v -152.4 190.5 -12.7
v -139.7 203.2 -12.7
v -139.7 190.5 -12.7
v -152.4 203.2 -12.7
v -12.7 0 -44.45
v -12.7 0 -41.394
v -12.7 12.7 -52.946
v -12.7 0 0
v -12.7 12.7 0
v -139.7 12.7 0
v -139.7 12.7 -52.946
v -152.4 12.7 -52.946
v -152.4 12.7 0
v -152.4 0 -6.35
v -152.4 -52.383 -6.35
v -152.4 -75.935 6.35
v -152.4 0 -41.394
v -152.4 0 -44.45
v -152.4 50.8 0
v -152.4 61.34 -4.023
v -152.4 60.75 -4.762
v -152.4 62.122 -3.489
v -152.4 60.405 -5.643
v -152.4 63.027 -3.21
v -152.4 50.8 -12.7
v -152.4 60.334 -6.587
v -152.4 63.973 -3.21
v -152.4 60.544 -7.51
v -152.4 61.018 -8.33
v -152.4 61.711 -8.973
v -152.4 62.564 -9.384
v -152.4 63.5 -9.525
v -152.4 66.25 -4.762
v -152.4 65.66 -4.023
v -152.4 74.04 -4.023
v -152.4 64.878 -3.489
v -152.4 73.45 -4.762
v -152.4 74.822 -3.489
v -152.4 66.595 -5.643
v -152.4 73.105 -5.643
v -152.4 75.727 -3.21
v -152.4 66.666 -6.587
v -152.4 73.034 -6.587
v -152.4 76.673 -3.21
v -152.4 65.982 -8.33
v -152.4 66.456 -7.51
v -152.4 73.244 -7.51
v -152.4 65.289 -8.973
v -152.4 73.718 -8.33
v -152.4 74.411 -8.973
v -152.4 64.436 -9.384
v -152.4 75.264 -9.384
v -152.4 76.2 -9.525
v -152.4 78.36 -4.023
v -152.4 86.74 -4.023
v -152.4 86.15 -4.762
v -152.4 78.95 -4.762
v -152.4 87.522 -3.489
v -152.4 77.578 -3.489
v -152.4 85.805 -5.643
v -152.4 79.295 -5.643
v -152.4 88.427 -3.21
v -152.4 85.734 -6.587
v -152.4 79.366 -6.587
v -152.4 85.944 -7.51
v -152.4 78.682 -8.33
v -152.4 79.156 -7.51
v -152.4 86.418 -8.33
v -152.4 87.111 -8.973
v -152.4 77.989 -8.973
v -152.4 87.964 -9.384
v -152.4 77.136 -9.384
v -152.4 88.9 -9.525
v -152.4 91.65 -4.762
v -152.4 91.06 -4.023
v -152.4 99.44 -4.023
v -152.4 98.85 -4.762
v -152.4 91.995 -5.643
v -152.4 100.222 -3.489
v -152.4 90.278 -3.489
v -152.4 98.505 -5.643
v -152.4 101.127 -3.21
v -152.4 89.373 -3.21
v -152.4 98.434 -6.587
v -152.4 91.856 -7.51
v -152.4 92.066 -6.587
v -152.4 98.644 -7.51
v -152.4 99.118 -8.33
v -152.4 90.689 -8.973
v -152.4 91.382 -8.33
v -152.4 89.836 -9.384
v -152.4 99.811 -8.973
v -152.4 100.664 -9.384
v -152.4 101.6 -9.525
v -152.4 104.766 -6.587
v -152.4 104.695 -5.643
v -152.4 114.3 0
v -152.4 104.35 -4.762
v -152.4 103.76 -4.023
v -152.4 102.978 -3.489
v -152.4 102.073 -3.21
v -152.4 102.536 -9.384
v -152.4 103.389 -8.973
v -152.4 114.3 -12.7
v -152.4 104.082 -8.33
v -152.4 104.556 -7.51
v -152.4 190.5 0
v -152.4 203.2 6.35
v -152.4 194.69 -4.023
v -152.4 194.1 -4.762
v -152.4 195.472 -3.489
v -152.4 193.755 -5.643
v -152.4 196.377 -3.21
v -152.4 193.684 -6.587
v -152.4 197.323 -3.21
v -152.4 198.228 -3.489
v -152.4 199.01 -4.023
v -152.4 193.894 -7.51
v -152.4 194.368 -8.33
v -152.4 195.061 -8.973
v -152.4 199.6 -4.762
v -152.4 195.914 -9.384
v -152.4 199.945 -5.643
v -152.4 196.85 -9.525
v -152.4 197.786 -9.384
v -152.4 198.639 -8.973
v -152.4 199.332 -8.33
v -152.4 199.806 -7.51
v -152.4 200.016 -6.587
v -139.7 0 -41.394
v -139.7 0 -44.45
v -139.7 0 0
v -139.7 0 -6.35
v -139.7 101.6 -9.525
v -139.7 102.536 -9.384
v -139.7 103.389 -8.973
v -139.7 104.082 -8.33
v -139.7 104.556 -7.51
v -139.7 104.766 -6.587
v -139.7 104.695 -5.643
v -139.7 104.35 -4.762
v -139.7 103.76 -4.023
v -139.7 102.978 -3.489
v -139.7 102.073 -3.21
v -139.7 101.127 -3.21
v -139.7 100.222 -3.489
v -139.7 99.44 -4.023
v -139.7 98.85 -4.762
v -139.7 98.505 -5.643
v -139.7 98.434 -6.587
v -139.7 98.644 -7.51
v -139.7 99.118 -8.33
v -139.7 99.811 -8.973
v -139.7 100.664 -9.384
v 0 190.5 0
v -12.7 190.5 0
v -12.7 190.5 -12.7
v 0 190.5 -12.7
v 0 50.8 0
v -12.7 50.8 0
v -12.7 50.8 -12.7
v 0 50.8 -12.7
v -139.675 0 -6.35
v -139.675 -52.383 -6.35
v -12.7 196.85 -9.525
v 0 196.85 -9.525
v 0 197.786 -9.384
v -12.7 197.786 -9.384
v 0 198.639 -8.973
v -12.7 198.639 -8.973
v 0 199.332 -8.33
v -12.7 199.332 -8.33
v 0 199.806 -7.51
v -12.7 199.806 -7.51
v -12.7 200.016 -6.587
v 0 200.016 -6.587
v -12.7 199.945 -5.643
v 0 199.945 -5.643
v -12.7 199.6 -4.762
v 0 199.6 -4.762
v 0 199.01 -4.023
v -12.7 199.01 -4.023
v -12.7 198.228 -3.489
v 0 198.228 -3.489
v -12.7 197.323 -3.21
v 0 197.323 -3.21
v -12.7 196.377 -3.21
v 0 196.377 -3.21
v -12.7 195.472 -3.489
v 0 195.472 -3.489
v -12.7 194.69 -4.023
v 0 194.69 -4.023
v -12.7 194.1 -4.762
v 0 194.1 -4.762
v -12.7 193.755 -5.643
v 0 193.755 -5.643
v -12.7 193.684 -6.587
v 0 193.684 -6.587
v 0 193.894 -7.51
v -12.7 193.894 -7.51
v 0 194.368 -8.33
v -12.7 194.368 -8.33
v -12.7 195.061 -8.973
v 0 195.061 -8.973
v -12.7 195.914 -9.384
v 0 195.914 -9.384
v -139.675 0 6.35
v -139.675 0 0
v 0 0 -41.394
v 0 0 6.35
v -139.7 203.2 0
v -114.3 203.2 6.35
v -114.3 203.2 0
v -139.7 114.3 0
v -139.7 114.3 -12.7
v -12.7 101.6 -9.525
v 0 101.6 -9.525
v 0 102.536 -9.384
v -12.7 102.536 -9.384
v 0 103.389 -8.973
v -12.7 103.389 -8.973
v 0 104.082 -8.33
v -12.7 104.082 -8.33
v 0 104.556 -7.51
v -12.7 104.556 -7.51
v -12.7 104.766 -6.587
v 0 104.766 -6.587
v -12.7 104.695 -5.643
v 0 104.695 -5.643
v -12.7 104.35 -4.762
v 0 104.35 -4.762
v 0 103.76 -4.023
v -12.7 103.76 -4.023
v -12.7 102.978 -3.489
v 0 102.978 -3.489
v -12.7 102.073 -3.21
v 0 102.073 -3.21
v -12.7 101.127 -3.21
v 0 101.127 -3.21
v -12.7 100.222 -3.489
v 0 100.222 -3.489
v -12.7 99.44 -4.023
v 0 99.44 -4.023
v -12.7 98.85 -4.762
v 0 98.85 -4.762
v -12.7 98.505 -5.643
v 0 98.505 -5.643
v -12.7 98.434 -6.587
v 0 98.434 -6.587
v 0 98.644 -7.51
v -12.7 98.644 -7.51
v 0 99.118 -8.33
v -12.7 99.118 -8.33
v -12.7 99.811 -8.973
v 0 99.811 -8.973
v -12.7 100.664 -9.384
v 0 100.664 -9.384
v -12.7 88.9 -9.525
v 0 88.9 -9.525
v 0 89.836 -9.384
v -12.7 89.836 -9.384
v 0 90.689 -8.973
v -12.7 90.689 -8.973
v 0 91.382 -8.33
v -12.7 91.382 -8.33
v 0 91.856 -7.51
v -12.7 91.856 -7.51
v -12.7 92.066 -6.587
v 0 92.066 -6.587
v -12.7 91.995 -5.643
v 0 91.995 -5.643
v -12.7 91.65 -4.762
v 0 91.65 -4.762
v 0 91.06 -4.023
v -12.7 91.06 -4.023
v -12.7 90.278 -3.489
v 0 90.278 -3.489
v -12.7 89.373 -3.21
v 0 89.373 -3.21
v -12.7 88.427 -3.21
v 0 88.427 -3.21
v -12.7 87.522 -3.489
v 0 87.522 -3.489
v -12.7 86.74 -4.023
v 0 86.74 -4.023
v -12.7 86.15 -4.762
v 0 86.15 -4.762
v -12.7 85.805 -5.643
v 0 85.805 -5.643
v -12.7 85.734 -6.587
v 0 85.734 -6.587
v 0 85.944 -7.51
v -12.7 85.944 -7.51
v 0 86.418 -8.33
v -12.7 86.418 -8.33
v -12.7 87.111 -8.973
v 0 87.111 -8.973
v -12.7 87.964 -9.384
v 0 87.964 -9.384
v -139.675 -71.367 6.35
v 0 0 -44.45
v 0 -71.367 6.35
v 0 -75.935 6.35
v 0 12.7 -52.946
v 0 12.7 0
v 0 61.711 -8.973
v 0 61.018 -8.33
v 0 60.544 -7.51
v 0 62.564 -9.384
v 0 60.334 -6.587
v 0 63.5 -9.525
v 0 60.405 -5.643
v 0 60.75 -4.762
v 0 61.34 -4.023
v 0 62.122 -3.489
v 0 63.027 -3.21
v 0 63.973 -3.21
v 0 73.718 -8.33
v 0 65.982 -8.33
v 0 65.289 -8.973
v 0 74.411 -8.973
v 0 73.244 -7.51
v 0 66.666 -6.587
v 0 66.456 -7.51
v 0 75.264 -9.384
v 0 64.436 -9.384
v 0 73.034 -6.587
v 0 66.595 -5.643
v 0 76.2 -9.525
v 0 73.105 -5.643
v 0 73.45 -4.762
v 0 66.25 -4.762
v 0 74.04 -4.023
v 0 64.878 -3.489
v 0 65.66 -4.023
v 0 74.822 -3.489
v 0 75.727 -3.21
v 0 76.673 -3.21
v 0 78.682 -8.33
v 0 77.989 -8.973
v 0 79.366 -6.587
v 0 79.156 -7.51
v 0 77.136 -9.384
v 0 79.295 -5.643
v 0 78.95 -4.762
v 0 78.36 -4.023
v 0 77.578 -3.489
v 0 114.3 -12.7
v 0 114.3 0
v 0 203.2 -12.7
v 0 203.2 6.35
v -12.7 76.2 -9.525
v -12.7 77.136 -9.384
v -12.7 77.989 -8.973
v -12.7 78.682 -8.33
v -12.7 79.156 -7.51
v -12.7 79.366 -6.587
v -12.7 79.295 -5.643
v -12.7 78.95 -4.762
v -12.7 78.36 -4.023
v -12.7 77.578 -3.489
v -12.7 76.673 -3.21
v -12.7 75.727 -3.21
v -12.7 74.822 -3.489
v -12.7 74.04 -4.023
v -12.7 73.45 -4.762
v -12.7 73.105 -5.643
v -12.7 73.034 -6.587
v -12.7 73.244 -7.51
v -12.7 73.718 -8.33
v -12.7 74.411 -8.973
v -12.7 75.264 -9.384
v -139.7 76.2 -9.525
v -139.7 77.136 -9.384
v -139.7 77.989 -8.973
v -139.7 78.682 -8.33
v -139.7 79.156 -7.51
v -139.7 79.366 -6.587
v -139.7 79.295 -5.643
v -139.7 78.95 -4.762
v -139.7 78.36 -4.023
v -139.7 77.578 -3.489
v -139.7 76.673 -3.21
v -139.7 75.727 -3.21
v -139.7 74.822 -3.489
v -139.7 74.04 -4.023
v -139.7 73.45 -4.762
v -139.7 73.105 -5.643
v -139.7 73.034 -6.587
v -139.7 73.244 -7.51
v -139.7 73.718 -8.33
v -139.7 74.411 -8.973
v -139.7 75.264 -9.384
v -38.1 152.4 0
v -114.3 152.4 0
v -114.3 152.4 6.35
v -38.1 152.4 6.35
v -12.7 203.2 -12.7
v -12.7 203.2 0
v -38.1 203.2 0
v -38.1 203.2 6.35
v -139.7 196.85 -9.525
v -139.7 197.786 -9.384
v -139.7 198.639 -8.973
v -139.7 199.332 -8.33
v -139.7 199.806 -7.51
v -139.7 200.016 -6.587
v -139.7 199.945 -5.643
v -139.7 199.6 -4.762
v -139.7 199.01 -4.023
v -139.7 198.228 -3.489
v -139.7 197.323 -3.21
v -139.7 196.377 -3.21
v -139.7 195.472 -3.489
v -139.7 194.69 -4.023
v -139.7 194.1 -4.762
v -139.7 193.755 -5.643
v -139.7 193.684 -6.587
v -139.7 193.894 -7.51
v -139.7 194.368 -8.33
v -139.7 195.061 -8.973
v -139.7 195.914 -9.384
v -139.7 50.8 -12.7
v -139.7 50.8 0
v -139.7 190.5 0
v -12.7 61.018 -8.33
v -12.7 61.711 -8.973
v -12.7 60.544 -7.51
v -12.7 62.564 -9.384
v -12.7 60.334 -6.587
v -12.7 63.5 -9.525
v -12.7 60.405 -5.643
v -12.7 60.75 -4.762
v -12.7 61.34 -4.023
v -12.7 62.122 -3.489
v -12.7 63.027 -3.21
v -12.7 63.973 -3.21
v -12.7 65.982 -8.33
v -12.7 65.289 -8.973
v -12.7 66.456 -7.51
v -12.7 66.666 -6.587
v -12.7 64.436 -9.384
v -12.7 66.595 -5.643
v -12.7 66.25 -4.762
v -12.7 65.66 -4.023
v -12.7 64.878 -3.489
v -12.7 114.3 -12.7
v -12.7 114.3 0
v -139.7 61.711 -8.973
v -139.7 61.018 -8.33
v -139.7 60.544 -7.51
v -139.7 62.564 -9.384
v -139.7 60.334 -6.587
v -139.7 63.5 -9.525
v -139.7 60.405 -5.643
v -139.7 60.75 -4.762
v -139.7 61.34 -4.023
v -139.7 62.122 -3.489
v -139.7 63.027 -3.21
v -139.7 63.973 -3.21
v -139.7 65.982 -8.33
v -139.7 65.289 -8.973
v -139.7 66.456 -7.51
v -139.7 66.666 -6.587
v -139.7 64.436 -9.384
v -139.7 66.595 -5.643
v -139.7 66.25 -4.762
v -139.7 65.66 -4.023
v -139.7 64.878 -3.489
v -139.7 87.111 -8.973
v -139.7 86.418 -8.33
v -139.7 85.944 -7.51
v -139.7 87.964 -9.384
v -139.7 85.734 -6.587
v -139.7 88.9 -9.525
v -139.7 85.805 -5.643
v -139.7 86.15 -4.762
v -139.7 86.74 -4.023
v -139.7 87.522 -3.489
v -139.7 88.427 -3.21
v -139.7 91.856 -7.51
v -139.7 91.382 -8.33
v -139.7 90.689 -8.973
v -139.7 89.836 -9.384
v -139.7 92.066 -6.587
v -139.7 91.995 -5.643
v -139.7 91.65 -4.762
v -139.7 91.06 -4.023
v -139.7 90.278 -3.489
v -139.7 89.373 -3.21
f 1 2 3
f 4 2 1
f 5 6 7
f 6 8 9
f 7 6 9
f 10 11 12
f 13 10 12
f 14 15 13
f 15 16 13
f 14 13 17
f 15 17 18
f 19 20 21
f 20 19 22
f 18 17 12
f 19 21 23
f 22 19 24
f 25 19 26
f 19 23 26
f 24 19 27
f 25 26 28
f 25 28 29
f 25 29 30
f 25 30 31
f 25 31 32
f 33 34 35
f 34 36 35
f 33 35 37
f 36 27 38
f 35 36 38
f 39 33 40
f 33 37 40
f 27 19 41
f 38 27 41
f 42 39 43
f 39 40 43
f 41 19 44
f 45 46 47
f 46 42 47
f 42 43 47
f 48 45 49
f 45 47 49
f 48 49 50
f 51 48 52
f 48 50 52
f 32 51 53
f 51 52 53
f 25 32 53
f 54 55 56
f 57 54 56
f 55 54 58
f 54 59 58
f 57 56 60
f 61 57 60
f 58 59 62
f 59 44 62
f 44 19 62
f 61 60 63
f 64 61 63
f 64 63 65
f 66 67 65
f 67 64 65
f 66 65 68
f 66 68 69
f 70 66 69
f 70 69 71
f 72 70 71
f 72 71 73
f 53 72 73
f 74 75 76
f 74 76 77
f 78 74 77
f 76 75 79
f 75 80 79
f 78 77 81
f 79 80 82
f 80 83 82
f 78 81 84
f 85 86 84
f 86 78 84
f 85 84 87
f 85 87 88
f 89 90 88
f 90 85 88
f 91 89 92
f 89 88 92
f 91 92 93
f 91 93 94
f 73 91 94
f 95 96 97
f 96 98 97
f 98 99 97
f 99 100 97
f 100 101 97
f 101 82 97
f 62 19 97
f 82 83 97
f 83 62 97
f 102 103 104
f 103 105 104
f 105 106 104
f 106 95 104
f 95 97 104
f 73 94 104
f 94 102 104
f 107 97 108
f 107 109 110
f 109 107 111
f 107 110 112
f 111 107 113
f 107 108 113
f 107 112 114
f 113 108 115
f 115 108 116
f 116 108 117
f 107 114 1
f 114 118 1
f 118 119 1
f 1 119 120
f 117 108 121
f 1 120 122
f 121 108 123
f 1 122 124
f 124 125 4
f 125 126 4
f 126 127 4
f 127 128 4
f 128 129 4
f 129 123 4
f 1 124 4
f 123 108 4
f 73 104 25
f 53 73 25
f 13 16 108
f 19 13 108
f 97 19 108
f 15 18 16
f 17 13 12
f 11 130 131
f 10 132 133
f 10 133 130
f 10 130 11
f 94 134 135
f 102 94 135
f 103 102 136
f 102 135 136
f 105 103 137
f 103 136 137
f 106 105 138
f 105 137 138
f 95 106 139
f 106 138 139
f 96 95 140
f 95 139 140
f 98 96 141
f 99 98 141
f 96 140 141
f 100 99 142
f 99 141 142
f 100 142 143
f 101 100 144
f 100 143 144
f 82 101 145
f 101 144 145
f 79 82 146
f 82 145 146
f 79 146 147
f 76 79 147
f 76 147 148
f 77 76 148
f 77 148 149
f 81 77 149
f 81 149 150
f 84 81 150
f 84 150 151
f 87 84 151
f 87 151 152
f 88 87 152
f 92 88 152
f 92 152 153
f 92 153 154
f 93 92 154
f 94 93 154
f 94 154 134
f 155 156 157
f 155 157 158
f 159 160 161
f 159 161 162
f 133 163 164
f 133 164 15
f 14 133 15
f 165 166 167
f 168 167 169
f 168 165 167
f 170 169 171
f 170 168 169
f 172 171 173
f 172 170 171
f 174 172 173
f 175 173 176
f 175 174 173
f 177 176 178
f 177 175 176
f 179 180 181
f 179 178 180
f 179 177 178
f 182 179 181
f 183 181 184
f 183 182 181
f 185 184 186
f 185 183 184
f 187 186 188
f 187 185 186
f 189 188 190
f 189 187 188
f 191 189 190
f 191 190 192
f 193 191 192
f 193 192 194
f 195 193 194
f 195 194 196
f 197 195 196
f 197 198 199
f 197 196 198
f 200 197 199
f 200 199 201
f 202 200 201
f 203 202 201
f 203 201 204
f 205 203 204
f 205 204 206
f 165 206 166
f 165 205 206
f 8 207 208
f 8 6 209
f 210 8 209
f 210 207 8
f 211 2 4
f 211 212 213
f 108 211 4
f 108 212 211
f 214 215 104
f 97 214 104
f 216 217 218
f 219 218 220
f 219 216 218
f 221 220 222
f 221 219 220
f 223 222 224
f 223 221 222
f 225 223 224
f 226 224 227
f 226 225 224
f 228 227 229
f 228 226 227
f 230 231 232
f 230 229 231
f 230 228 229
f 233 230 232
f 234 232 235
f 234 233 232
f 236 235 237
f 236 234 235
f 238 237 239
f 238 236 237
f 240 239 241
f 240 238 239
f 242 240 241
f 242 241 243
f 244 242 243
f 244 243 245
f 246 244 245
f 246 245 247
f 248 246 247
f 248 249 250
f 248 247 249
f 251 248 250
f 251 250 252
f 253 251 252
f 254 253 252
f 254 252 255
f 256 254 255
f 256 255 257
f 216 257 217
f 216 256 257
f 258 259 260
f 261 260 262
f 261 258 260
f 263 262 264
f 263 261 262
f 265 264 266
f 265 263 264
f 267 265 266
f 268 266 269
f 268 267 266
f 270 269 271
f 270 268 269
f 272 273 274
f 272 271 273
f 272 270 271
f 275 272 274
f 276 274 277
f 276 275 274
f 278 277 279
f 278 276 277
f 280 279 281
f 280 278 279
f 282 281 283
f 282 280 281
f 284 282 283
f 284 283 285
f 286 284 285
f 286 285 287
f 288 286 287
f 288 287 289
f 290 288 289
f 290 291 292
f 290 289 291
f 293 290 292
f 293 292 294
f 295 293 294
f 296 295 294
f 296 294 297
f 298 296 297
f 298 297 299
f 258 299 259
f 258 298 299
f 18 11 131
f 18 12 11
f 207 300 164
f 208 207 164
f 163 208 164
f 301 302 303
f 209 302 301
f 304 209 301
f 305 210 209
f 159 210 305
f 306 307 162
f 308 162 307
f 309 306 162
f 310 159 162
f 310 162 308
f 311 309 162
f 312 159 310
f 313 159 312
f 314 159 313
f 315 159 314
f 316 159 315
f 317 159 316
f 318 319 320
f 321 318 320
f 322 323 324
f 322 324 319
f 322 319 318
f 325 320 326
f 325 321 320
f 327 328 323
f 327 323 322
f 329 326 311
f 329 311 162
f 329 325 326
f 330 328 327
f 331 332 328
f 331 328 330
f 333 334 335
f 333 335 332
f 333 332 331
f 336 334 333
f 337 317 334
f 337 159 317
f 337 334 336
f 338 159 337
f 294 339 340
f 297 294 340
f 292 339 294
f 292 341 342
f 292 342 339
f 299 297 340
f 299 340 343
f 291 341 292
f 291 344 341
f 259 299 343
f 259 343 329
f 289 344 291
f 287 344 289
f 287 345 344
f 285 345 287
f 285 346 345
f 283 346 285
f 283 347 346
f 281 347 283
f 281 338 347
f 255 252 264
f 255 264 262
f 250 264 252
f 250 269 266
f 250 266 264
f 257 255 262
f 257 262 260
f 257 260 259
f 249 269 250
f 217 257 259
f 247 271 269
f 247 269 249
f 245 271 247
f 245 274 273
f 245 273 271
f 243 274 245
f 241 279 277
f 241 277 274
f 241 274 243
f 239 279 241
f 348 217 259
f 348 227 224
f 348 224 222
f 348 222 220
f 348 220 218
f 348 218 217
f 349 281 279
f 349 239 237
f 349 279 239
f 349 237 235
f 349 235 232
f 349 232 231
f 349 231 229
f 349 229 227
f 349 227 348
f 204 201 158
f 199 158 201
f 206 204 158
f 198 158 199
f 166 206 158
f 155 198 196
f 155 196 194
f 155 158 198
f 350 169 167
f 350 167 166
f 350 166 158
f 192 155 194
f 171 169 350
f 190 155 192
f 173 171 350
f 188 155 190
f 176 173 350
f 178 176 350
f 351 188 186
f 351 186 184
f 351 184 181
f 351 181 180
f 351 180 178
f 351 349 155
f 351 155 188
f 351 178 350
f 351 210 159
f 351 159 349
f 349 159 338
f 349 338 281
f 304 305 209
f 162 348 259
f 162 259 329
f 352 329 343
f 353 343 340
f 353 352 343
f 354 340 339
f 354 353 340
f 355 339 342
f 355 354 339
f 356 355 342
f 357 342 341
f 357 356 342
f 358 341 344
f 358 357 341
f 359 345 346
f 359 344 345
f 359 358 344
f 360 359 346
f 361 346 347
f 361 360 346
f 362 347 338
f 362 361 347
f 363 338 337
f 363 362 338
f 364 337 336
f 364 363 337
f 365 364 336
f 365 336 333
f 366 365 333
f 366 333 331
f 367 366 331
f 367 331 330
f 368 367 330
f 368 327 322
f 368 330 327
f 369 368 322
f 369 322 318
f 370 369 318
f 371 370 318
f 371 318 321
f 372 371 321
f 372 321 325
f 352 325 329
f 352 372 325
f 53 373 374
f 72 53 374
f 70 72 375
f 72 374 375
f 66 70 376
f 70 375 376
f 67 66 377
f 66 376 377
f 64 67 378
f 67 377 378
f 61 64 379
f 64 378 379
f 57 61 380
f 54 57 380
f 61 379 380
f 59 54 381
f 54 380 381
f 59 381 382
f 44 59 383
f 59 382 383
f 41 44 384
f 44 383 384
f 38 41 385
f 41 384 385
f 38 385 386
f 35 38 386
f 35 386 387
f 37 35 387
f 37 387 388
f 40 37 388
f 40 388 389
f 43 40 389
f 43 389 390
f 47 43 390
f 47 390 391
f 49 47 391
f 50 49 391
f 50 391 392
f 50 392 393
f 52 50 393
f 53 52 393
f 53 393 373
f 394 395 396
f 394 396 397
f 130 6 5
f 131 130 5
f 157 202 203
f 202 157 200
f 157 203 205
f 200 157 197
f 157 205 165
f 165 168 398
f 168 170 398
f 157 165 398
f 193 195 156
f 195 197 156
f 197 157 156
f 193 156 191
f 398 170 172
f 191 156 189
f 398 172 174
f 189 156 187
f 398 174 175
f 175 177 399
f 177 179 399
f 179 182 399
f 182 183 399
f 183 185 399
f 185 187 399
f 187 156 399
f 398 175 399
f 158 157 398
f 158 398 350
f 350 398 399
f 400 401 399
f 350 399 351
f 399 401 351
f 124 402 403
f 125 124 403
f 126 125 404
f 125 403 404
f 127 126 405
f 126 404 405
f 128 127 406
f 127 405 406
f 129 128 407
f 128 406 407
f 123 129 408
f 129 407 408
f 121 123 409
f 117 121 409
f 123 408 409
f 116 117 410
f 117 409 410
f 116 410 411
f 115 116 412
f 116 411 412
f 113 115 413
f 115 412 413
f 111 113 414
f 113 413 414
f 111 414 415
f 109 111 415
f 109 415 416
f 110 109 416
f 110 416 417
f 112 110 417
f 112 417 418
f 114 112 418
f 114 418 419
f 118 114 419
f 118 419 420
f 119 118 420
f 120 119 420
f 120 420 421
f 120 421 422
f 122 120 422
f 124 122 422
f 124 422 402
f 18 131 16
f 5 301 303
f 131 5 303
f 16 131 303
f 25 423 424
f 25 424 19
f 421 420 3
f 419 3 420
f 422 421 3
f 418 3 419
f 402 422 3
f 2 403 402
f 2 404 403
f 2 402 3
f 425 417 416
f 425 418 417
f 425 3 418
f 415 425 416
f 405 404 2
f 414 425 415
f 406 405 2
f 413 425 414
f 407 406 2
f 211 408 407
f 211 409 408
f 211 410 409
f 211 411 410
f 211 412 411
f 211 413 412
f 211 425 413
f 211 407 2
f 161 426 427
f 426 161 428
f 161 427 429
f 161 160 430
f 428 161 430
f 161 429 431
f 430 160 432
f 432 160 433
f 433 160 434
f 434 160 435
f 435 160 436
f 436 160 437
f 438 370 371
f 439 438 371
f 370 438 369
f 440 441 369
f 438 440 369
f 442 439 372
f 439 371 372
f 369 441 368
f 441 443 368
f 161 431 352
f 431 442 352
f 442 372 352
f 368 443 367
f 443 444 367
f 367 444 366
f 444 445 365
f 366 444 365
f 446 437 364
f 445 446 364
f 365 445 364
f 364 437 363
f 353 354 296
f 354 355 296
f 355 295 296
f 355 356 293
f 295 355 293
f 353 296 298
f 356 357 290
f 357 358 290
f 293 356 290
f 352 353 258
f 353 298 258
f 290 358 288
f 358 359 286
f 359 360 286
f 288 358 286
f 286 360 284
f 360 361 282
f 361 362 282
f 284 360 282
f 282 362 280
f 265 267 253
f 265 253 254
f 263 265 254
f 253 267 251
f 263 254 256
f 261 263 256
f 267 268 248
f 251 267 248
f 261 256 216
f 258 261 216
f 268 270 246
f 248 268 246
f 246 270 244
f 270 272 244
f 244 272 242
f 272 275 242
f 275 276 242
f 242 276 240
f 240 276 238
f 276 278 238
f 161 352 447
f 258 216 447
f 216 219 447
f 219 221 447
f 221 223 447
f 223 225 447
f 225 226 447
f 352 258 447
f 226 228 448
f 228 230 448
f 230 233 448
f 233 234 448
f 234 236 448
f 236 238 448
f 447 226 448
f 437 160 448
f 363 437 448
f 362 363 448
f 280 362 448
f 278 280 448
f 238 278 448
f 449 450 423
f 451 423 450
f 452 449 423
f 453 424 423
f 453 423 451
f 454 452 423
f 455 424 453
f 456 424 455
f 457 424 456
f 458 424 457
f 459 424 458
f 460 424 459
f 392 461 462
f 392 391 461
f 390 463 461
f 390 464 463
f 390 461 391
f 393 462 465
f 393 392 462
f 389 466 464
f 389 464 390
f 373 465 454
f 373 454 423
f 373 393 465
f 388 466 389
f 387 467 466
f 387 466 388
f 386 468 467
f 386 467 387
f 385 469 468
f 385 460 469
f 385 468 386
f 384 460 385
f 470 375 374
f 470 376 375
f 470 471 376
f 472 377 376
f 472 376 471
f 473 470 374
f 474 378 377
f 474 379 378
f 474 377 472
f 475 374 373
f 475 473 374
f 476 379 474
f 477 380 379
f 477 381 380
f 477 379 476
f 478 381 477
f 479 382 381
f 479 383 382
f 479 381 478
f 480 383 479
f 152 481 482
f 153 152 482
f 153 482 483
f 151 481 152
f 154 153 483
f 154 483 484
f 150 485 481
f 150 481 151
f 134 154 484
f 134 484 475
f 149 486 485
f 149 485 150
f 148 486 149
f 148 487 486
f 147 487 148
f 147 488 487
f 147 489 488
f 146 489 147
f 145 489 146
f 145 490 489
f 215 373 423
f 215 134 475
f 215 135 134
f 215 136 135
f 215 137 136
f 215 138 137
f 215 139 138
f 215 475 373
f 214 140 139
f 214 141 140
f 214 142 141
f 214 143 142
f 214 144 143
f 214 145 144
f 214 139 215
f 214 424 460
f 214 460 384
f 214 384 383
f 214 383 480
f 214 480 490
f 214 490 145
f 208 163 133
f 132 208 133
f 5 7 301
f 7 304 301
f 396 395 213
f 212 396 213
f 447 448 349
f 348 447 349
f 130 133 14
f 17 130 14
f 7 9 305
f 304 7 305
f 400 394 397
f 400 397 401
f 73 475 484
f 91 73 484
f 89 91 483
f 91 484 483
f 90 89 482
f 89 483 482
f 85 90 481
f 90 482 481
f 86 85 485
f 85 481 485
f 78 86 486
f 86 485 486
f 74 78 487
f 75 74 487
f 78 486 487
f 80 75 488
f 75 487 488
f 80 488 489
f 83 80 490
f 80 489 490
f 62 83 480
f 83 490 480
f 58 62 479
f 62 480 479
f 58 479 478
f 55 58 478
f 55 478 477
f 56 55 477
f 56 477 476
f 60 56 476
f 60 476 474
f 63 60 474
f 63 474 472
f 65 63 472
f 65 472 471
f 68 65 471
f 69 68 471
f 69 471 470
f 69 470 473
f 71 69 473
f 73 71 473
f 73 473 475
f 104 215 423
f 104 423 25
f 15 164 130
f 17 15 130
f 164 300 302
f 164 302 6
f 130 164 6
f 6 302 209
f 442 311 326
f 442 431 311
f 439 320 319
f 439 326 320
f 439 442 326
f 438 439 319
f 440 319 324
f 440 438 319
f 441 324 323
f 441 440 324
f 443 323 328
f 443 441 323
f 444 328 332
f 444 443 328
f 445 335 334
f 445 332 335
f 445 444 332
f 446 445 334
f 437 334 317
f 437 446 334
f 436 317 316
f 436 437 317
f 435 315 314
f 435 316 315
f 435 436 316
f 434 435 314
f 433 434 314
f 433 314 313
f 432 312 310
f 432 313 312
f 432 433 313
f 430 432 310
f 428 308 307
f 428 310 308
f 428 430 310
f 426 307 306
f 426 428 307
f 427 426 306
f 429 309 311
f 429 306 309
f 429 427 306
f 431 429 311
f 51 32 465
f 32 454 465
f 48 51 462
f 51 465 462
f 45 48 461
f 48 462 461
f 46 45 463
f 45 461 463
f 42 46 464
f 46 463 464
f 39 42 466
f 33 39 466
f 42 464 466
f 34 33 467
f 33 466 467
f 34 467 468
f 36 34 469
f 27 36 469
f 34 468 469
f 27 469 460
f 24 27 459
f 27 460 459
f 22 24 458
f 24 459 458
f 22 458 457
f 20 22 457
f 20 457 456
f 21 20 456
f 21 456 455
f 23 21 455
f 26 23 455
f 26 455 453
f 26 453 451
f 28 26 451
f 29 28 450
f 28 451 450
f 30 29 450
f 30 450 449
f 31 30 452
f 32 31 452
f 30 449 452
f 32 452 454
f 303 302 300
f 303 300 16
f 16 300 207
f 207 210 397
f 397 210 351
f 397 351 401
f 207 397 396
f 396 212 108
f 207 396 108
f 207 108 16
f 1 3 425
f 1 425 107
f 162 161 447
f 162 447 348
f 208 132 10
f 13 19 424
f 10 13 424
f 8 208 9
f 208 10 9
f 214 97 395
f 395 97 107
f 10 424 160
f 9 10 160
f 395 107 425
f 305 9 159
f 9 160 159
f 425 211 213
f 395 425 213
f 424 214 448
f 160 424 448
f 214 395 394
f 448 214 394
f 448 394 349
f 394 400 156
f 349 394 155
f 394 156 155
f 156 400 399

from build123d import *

# Parameters (mm, degrees)
SKETCH1_W               = 152.4
SKETCH1_H               = 203.2
BOSS_EXTRUDE1_DEPTH     = 6.35
CUT_EXTRUDE1_DEPTH      = 255.079362602
CUT_EXTRUDE1_DEPTH_BACK = 255.079362602
SKETCH2_W               = 76.2
SKETCH2_H               = 50.8
SKETCH3_W               = 12.7
SKETCH3_H               = 12.7
SKETCH3_H_2             = 63.5
BOSS_EXTRUDE2_DEPTH     = 12.7
SKETCH4_R               = 3.175
CUT_EXTRUDE2_DEPTH      = 247.916220609
BOSS_EXTRUDE3_DEPTH     = 152.4
BOSS_EXTRUDE5_REACH     = 259.86
SKETCH11_W              = 12.72505143
SKETCH11_H              = 12.7
BOSS_EXTRUDE8_REACH     = 259.86
SKETCH13_W              = 12.7
SKETCH13_H              = 12.7


with BuildPart() as part:
    # Sketch1 → Boss-Extrude1 (new body)
    with BuildSketch(Plane.XY):
        with Locations((-76.2, 101.6)):
            Rectangle(SKETCH1_W, SKETCH1_H)
    extrude(amount=BOSS_EXTRUDE1_DEPTH)

    # Sketch2 → Cut-Extrude1 (cut, two sides: drawn at the far end of the back side and taken through both)
    with BuildSketch(Plane.XY.offset(6.35).offset(-CUT_EXTRUDE1_DEPTH_BACK)):
        with Locations((-76.2, 177.8)):
            Rectangle(SKETCH2_W, SKETCH2_H)
    extrude(amount=CUT_EXTRUDE1_DEPTH + CUT_EXTRUDE1_DEPTH_BACK, mode=Mode.SUBTRACT)

    # Sketch3 → Boss-Extrude2 (add)
    with BuildSketch(Plane(origin=(0, 0, 0), x_dir=(-1, 0, 0), z_dir=(0, 0, -1))):
        with Locations((146.05, 196.85)):
            Rectangle(SKETCH3_W, SKETCH3_H)
        with Locations((146.05, 82.55)):
            Rectangle(SKETCH3_W, SKETCH3_H_2)
    boss_extrude2 = extrude(amount=BOSS_EXTRUDE2_DEPTH)

    # Sketch4 → Cut-Extrude2 (cut, symmetric)
    with BuildSketch(Plane(origin=(-139.7, 0, 0), x_dir=(0, 0, -1), z_dir=(1, 0, 0))):
        with Locations((6.35, 196.85)):
            Circle(SKETCH4_R)
        with Locations((6.35, 101.6)):
            Circle(SKETCH4_R)
        with Locations((6.35, 88.9)):
            Circle(SKETCH4_R)
        with Locations((6.35, 76.2)):
            Circle(SKETCH4_R)
        with Locations((6.35, 63.5)):
            Circle(SKETCH4_R)
    cut_extrude2 = extrude(amount=CUT_EXTRUDE2_DEPTH, both=True, mode=Mode.SUBTRACT)



with BuildPart() as body_2:
    # Sketch6 → Boss-Extrude3 (new body)
    with BuildSketch(Plane(origin=(0, 0, 0), x_dir=(0, 0, -1), z_dir=(1, 0, 0))):
        Polygon((44.45, 0), (-6.35, -75.934955719), (-6.35, -71.366926193), (41.394017446, 0), align=None)
    extrude(amount=-BOSS_EXTRUDE3_DEPTH)


with BuildPart() as body_3:
    # Boss-Extrude5: up to this plane
    boss_extrude5_end = Plane(origin=(-243.760590519, 0, -41.394017446), z_dir=(0, 0.5560384374855327, 0.8311565773298358))
    # Sketch11 → Boss-Extrude5 (new, up to the surface)
    with BuildSketch(Plane(origin=(0, 0, 0), x_dir=(-1, 0, 0), z_dir=(0, -1, 0)), mode=Mode.PRIVATE) as boss_extrude5_sk1:
        with Locations((146.037474285, 0)):
            Rectangle(SKETCH11_W, SKETCH11_H)
    boss_extrude5_tool1 = split(extrude(boss_extrude5_sk1.sketch, amount=BOSS_EXTRUDE5_REACH, mode=Mode.PRIVATE), bisect_by=boss_extrude5_end, keep=Keep.BOTH, mode=Mode.PRIVATE)
    add(boss_extrude5_tool1.solids().sort_by_distance((-146.037474, 0, 0))[0])


with BuildPart() as part_1:
    add(part.part)

    add(body_2.part)  # Boss-Extrude8 merges body 2

    add(body_3.part)  # Boss-Extrude8 merges body 3
    # Boss-Extrude8: up to this plane
    boss_extrude8_end = Plane(origin=(-243.760590519, 0, -44.45), z_dir=(0, -0.5560384374855327, -0.8311565773298358))
    # Sketch13 → Boss-Extrude8 (add, up to the surface)
    with BuildSketch(Plane(origin=(0, 0, 0), x_dir=(-1, 0, 0), z_dir=(0, 0, -1)), mode=Mode.PRIVATE) as boss_extrude8_sk1:
        with Locations((146.05, 6.35)):
            Rectangle(SKETCH13_W, SKETCH13_H)
    boss_extrude8_tool1 = split(extrude(boss_extrude8_sk1.sketch, amount=BOSS_EXTRUDE8_REACH, mode=Mode.PRIVATE), bisect_by=boss_extrude8_end, keep=Keep.BOTH, mode=Mode.PRIVATE)
    boss_extrude8 = boss_extrude8_tool1.solids().sort_by_distance((-146.05, 6.35, 0))[0]
    add(boss_extrude8)

    # Mirror1: Boss-Extrude2, Cut-Extrude2, Boss-Extrude8 across plane
    add(boss_extrude2.mirror(Plane.ZY.offset(76.2)))
    add(cut_extrude2.mirror(Plane.ZY.offset(76.2)), mode=Mode.SUBTRACT)
    add(boss_extrude8.mirror(Plane.ZY.offset(76.2)))


solid = part_1.part
